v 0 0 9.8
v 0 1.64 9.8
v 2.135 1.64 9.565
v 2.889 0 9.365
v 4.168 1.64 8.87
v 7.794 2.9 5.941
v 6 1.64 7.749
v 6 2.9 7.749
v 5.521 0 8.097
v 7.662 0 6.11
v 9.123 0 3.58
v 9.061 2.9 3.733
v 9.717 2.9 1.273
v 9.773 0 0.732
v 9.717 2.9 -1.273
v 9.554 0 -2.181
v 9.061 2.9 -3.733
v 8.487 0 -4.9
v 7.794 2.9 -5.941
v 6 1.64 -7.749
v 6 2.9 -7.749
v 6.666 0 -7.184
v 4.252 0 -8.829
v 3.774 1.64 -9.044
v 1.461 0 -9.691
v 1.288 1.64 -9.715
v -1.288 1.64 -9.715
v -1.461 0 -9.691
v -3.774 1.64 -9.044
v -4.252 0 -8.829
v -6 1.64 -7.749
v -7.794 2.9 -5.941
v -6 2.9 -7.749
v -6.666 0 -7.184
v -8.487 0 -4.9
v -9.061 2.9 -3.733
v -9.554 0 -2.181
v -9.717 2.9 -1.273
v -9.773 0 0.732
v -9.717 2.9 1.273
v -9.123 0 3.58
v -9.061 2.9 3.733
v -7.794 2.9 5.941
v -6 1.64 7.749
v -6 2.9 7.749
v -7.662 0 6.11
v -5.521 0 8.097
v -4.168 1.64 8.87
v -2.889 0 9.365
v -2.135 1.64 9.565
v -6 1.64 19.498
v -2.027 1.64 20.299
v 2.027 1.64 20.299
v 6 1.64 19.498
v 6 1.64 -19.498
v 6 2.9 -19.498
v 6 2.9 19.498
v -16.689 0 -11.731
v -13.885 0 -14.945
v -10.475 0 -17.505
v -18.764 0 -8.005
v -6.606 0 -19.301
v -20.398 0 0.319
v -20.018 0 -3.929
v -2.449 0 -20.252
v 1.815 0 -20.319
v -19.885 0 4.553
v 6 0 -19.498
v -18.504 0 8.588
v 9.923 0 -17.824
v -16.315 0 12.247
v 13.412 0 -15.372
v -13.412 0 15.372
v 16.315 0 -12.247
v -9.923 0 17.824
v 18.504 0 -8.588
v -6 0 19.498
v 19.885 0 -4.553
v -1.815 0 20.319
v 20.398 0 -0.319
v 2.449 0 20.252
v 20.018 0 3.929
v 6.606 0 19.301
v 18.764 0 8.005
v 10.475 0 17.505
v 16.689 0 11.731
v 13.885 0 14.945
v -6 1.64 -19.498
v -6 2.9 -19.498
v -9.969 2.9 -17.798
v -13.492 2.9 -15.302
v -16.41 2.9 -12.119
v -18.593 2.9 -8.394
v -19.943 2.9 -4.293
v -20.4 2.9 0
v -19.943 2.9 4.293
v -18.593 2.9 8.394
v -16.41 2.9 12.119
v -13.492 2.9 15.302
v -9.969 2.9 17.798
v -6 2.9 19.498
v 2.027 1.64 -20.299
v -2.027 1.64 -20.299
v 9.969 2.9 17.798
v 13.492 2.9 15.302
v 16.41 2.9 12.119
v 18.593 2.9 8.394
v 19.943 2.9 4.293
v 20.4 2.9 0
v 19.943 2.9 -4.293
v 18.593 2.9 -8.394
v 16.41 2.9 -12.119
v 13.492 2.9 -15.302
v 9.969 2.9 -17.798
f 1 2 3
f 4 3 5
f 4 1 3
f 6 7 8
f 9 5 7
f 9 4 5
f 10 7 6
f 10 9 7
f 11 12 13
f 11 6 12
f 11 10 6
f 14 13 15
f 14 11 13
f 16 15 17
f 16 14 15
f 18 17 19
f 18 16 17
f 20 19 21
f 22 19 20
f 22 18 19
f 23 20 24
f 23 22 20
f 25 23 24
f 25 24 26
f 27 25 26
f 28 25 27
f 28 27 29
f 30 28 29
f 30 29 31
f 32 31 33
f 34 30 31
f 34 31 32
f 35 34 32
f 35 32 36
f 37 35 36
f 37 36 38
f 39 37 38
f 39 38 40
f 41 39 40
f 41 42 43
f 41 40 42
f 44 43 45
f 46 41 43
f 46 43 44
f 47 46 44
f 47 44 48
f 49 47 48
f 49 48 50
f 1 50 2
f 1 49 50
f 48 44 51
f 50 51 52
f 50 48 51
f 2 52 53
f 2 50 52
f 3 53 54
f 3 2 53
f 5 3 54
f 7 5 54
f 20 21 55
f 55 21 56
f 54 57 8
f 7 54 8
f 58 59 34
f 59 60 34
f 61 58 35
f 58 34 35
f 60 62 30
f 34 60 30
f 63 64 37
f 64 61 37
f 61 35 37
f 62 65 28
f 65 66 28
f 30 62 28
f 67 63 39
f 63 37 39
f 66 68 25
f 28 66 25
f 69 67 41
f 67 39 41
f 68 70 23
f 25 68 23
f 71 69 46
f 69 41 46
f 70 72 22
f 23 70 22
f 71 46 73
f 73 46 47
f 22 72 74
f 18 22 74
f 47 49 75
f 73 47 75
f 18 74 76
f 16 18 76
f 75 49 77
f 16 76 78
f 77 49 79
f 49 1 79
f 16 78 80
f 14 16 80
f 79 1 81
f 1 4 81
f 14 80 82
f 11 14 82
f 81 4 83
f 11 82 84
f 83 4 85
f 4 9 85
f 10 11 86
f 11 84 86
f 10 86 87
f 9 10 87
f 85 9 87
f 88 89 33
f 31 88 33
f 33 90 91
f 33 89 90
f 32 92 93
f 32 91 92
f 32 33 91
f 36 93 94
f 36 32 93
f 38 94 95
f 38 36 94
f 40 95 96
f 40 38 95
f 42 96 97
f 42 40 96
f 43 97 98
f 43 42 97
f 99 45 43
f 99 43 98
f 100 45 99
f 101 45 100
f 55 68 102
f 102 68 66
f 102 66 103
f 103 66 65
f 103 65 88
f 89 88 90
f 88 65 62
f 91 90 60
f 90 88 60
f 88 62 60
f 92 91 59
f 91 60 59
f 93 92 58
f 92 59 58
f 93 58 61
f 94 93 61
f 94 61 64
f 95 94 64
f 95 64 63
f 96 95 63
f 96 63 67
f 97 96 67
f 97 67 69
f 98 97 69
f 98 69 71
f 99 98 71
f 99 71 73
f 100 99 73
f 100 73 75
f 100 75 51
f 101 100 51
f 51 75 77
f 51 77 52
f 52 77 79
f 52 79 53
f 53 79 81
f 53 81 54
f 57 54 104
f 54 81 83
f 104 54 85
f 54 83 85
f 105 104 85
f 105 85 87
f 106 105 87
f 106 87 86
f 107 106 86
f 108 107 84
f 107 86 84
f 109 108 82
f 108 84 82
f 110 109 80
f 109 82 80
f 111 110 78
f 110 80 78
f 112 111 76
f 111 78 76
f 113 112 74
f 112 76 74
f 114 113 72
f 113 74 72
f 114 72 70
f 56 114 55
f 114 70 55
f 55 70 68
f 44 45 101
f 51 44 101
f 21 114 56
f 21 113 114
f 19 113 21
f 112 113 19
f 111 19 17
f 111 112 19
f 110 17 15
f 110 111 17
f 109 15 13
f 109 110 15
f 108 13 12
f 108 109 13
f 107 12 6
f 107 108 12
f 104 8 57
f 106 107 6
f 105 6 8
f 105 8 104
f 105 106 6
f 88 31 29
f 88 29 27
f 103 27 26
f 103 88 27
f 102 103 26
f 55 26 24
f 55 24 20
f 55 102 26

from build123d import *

# Parameters (mm, degrees)
IZIM1_R                     = 40.8
Y_KSEKLIK_EKSTR_ZYON1_DEPTH = 2.9
KES_EKSTR_ZYON1_DEPTH       = 16
KES_EKSTR_ZYON1_DEPTH_BACK  = 7.9
IZIM2_R                     = 9.8
KES_EKSTR_ZYON2_DEPTH       = 1.26
KES_EKSTR_ZYON3_DEPTH       = 21
KES_EKSTR_ZYON3_DEPTH_BACK  = 18.26
IZIM4_R                     = 40.8
IZIM4_R_2                   = 20.4


with BuildPart() as part:
    # Çizim1 → Yükseklik-Ekstrüzyon1 (new body)
    with BuildSketch(Plane(origin=(0, 0, 0), x_dir=(1, 0, 0), z_dir=(0, 1, 0))):
        with Locations(Location((0, 0, 0), (0, 0, 270))):
            Circle(IZIM1_R)
    extrude(amount=Y_KSEKLIK_EKSTR_ZYON1_DEPTH)

    # Çizim2 → Kes-Ekstrüzyon1 (cut, two sides: drawn at the far end of the back side and taken through both)
    with BuildSketch(Plane(origin=(0, 2.9, 0), x_dir=(1, 0, 0), z_dir=(0, 1, 0)).offset(-KES_EKSTR_ZYON1_DEPTH_BACK)):
        with Locations(Location((0, 0, 0), (0, 0, 270))):
            Circle(IZIM2_R)
    extrude(amount=KES_EKSTR_ZYON1_DEPTH + KES_EKSTR_ZYON1_DEPTH_BACK, mode=Mode.SUBTRACT)

    # Çizim3 → Kes-Ekstrüzyon2 (cut)
    with BuildSketch(Plane(origin=(0, 2.9, 0), x_dir=(1, 0, 0), z_dir=(0, 1, 0))):
        Polygon((6, 0), (6, 43.137439927), (-6, 43.137439927), (-6, 0), (-6, -43.926883272), (6, -43.926883272), align=None)
    extrude(amount=-KES_EKSTR_ZYON2_DEPTH, mode=Mode.SUBTRACT)

    # Çizim4 → Kes-Ekstrüzyon3 (cut, two sides: drawn at the far end of the back side and taken through both)
    with BuildSketch(Plane(origin=(0, 2.9, 0), x_dir=(1, 0, 0), z_dir=(0, 1, 0)).offset(-KES_EKSTR_ZYON3_DEPTH_BACK)):
        Circle(IZIM4_R)
        with Locations(Location((0, 0, 0), (0, 0, 72.895364823))):
            Circle(IZIM4_R_2, mode=Mode.SUBTRACT)
    extrude(amount=KES_EKSTR_ZYON3_DEPTH + KES_EKSTR_ZYON3_DEPTH_BACK, mode=Mode.SUBTRACT)


solid = part.part
